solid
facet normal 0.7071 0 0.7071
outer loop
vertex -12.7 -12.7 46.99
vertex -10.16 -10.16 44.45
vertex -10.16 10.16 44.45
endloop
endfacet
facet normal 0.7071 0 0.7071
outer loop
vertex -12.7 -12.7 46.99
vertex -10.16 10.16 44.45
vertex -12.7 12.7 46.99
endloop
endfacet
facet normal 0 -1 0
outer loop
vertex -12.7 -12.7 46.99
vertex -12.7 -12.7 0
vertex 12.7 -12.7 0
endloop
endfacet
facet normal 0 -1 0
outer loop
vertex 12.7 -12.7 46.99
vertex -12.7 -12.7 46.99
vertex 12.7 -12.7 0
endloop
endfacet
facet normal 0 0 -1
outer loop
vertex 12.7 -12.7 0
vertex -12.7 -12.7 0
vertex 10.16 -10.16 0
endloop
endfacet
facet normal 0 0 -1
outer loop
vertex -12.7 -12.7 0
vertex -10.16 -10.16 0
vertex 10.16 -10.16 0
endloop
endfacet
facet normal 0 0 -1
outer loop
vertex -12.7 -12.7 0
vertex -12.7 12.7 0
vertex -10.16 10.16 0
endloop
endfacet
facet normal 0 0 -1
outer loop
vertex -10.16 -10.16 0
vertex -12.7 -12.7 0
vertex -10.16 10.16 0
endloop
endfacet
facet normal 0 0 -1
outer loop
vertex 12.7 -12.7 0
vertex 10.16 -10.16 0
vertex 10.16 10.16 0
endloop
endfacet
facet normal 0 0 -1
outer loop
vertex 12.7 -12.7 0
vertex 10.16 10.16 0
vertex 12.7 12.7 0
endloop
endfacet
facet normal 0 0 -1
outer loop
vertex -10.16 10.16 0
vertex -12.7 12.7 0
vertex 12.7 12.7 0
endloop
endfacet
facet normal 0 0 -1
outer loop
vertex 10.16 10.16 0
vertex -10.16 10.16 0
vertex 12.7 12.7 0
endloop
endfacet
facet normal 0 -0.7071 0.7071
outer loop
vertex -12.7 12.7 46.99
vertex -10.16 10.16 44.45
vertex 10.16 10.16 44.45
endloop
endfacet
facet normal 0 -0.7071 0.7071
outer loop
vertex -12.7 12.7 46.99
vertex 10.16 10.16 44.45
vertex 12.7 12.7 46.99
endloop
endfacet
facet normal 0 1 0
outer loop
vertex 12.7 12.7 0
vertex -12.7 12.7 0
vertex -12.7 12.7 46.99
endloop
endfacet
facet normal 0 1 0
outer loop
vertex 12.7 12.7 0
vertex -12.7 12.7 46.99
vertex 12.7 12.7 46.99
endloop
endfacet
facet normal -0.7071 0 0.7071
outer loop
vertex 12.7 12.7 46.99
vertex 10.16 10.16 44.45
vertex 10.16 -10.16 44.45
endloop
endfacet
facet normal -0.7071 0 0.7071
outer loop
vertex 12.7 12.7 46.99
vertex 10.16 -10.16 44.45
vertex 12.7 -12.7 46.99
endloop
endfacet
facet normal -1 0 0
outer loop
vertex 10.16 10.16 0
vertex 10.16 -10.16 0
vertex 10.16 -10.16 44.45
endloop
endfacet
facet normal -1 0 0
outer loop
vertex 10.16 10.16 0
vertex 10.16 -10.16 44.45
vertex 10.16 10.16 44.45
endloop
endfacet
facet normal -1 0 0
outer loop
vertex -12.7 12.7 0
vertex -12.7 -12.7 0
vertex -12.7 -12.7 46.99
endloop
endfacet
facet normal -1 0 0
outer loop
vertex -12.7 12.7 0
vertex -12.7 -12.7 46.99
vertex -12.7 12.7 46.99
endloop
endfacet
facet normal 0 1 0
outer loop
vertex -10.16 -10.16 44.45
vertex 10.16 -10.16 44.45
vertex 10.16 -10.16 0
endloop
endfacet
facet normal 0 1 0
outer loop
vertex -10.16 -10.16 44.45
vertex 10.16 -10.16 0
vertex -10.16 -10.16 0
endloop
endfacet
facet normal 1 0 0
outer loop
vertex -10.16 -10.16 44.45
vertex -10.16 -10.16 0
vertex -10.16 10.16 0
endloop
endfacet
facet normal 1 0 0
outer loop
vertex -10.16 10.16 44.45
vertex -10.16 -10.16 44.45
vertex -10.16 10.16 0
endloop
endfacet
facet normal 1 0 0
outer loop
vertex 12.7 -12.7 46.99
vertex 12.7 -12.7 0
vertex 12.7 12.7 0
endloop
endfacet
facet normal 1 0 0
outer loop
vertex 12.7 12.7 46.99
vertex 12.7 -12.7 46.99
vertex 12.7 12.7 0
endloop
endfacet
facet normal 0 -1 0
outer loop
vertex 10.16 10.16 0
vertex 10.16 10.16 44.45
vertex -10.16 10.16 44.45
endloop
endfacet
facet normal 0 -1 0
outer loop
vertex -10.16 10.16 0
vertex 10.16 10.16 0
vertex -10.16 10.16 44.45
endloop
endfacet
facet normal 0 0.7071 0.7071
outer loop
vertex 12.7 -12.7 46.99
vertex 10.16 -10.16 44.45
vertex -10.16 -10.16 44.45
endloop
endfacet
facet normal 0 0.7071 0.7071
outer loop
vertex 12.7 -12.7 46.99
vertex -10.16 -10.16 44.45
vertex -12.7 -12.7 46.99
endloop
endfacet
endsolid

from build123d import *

# Parameters (mm, degrees)
F0_W         = 25.4
F0_H         = 25.4
F0_W_2       = 20.32
F0_H_2       = 20.32
F1_DEPTH     = 50.8
F2_T1_DEPTH  = 20.32
F2_T3_DEPTH  = 20.32
F2_T9_DEPTH  = 36.6501869736
F2_T15_DEPTH = 36.6501869736
F2_T24_DEPTH = 36.6501869736
F2_T30_DEPTH = 36.6501869736
F2_T39_DEPTH = 36.6501869736
F2_T45_DEPTH = 36.6501869736
F2_T54_DEPTH = 36.6501869736
F2_T60_DEPTH = 36.6501869736


# Not quite as in the source:
# - a fillet or chamfer that OpenCascade refuses, or shapes differently, is made with other operations: its cross-section is extruded or revolved along the edge and cut away or added


with BuildPart() as f1:
    # F0 (on Top) → F1 (new body)
    with BuildSketch(Plane.XY):
        Rectangle(F0_W, F0_H)
        Rectangle(F0_W_2, F0_H_2, mode=Mode.SUBTRACT)
    extrude(amount=F1_DEPTH)

    # F2: chamfer of 6.35 on 4 edges, made by hand

    # F2_s2 → F2_t1 (cut)
    with BuildSketch(Plane.XZ.offset(-10.16)):
        Polygon((-10.16, 44.45), (-16.51, 50.8), (-10.16, 50.8), align=None)
        Polygon((10.16, 44.45), (16.51, 50.8), (10.16, 50.8), align=None)
    extrude(amount=F2_T1_DEPTH, mode=Mode.SUBTRACT)

    # F2_s4 → F2_t3 (cut)
    with BuildSketch(Plane.YZ.offset(-10.16)):
        Polygon((-10.16, 44.45), (-16.51, 50.8), (-10.16, 50.8), align=None)
        Polygon((10.16, 44.45), (16.51, 50.8), (10.16, 50.8), align=None)
    extrude(amount=F2_T3_DEPTH, mode=Mode.SUBTRACT)


with BuildPart() as f2_tool7:
    # F2_s8 → F2_t9 (new body)
    with BuildSketch(Plane.YZ.offset(10.16)):
        Polygon((-10.16, 44.45), (-16.51, 50.8), (-10.16, 50.8), align=None)
    extrude(amount=-F2_T9_DEPTH)

    split(bisect_by=Plane.XZ.offset(12.7), keep=Keep.BOTTOM)

    split(bisect_by=Plane.YZ.offset(-12.7), keep=Keep.TOP)

    split(bisect_by=Plane.YZ.offset(-10.16), keep=Keep.BOTTOM)


with BuildPart() as f2_tool13:
    # F2_s14 → F2_t15 (new body)
    with BuildSketch(Plane.XZ.offset(26.4901869736)):
        Polygon((-10.16, 44.45), (-16.51, 50.8), (-10.16, 50.8), align=None)
    extrude(amount=-F2_T15_DEPTH)

    split(bisect_by=Plane.XZ.offset(12.7), keep=Keep.BOTTOM)

    split(bisect_by=Plane.YZ.offset(-12.7), keep=Keep.TOP)

    split(bisect_by=Plane.XZ.offset(10.16), keep=Keep.TOP)


with BuildPart() as f2_tool7_1:
    add(f2_tool7.part)

    # F2_t19: intersect F2_tool13
    add(f2_tool13.part, mode=Mode.INTERSECT)


with BuildPart() as f1_1:
    add(f1.part)

    # F2_t5: cut F2_tool7
    add(f2_tool7_1.part, mode=Mode.SUBTRACT)


with BuildPart() as f2_tool22:
    # F2_s23 → F2_t24 (new body)
    with BuildSketch(Plane.YZ.offset(-26.4901869736)):
        Polygon((10.16, 44.45), (16.51, 50.8), (10.16, 50.8), align=None)
    extrude(amount=F2_T24_DEPTH)

    split(bisect_by=Plane.XZ.offset(-12.7), keep=Keep.TOP)

    split(bisect_by=Plane.YZ.offset(-12.7), keep=Keep.TOP)

    split(bisect_by=Plane.YZ.offset(-10.16), keep=Keep.BOTTOM)


with BuildPart() as f2_tool28:
    # F2_s29 → F2_t30 (new body)
    with BuildSketch(Plane.XZ.offset(10.16)):
        Polygon((-10.16, 44.45), (-16.51, 50.8), (-10.16, 50.8), align=None)
    extrude(amount=-F2_T30_DEPTH)

    split(bisect_by=Plane.XZ.offset(-12.7), keep=Keep.TOP)

    split(bisect_by=Plane.YZ.offset(-12.7), keep=Keep.TOP)

    split(bisect_by=Plane.XZ.offset(-10.16), keep=Keep.BOTTOM)


with BuildPart() as f2_tool22_1:
    add(f2_tool22.part)

    # F2_t34: intersect F2_tool28
    add(f2_tool28.part, mode=Mode.INTERSECT)


with BuildPart() as f1_2:
    add(f1_1.part)

    # F2_t20: cut F2_tool22
    add(f2_tool22_1.part, mode=Mode.SUBTRACT)


with BuildPart() as f2_tool37:
    # F2_s38 → F2_t39 (new body)
    with BuildSketch(Plane.YZ.offset(-10.16)):
        Polygon((10.16, 44.45), (16.51, 50.8), (10.16, 50.8), align=None)
    extrude(amount=F2_T39_DEPTH)

    split(bisect_by=Plane.YZ.offset(12.7), keep=Keep.BOTTOM)

    split(bisect_by=Plane.XZ.offset(-12.7), keep=Keep.TOP)

    split(bisect_by=Plane.YZ.offset(10.16), keep=Keep.TOP)


with BuildPart() as f2_tool43:
    # F2_s44 → F2_t45 (new body)
    with BuildSketch(Plane.XZ.offset(-26.4901869736)):
        Polygon((10.16, 44.45), (16.51, 50.8), (10.16, 50.8), align=None)
    extrude(amount=F2_T45_DEPTH)

    split(bisect_by=Plane.YZ.offset(12.7), keep=Keep.BOTTOM)

    split(bisect_by=Plane.XZ.offset(-12.7), keep=Keep.TOP)

    split(bisect_by=Plane.XZ.offset(-10.16), keep=Keep.BOTTOM)


with BuildPart() as f2_tool37_1:
    add(f2_tool37.part)

    # F2_t49: intersect F2_tool43
    add(f2_tool43.part, mode=Mode.INTERSECT)


with BuildPart() as f1_3:
    add(f1_2.part)

    # F2_t35: cut F2_tool37
    add(f2_tool37_1.part, mode=Mode.SUBTRACT)


with BuildPart() as f2_tool52:
    # F2_s53 → F2_t54 (new body)
    with BuildSketch(Plane.XZ.offset(-10.16)):
        Polygon((10.16, 44.45), (16.51, 50.8), (10.16, 50.8), align=None)
    extrude(amount=F2_T54_DEPTH)

    split(bisect_by=Plane.XZ.offset(12.7), keep=Keep.BOTTOM)

    split(bisect_by=Plane.YZ.offset(12.7), keep=Keep.BOTTOM)

    split(bisect_by=Plane.XZ.offset(10.16), keep=Keep.TOP)


with BuildPart() as f2_tool58:
    # F2_s59 → F2_t60 (new body)
    with BuildSketch(Plane.YZ.offset(26.4901869736)):
        Polygon((-10.16, 44.45), (-16.51, 50.8), (-10.16, 50.8), align=None)
    extrude(amount=-F2_T60_DEPTH)

    split(bisect_by=Plane.XZ.offset(12.7), keep=Keep.BOTTOM)

    split(bisect_by=Plane.YZ.offset(12.7), keep=Keep.BOTTOM)

    split(bisect_by=Plane.YZ.offset(10.16), keep=Keep.TOP)


with BuildPart() as f2_tool52_1:
    add(f2_tool52.part)

    # F2_t64: intersect F2_tool58
    add(f2_tool58.part, mode=Mode.INTERSECT)


with BuildPart() as f1_4:
    add(f1_3.part)

    # F2_t50: cut F2_tool52
    add(f2_tool52_1.part, mode=Mode.SUBTRACT)


solid = f1_4.part
